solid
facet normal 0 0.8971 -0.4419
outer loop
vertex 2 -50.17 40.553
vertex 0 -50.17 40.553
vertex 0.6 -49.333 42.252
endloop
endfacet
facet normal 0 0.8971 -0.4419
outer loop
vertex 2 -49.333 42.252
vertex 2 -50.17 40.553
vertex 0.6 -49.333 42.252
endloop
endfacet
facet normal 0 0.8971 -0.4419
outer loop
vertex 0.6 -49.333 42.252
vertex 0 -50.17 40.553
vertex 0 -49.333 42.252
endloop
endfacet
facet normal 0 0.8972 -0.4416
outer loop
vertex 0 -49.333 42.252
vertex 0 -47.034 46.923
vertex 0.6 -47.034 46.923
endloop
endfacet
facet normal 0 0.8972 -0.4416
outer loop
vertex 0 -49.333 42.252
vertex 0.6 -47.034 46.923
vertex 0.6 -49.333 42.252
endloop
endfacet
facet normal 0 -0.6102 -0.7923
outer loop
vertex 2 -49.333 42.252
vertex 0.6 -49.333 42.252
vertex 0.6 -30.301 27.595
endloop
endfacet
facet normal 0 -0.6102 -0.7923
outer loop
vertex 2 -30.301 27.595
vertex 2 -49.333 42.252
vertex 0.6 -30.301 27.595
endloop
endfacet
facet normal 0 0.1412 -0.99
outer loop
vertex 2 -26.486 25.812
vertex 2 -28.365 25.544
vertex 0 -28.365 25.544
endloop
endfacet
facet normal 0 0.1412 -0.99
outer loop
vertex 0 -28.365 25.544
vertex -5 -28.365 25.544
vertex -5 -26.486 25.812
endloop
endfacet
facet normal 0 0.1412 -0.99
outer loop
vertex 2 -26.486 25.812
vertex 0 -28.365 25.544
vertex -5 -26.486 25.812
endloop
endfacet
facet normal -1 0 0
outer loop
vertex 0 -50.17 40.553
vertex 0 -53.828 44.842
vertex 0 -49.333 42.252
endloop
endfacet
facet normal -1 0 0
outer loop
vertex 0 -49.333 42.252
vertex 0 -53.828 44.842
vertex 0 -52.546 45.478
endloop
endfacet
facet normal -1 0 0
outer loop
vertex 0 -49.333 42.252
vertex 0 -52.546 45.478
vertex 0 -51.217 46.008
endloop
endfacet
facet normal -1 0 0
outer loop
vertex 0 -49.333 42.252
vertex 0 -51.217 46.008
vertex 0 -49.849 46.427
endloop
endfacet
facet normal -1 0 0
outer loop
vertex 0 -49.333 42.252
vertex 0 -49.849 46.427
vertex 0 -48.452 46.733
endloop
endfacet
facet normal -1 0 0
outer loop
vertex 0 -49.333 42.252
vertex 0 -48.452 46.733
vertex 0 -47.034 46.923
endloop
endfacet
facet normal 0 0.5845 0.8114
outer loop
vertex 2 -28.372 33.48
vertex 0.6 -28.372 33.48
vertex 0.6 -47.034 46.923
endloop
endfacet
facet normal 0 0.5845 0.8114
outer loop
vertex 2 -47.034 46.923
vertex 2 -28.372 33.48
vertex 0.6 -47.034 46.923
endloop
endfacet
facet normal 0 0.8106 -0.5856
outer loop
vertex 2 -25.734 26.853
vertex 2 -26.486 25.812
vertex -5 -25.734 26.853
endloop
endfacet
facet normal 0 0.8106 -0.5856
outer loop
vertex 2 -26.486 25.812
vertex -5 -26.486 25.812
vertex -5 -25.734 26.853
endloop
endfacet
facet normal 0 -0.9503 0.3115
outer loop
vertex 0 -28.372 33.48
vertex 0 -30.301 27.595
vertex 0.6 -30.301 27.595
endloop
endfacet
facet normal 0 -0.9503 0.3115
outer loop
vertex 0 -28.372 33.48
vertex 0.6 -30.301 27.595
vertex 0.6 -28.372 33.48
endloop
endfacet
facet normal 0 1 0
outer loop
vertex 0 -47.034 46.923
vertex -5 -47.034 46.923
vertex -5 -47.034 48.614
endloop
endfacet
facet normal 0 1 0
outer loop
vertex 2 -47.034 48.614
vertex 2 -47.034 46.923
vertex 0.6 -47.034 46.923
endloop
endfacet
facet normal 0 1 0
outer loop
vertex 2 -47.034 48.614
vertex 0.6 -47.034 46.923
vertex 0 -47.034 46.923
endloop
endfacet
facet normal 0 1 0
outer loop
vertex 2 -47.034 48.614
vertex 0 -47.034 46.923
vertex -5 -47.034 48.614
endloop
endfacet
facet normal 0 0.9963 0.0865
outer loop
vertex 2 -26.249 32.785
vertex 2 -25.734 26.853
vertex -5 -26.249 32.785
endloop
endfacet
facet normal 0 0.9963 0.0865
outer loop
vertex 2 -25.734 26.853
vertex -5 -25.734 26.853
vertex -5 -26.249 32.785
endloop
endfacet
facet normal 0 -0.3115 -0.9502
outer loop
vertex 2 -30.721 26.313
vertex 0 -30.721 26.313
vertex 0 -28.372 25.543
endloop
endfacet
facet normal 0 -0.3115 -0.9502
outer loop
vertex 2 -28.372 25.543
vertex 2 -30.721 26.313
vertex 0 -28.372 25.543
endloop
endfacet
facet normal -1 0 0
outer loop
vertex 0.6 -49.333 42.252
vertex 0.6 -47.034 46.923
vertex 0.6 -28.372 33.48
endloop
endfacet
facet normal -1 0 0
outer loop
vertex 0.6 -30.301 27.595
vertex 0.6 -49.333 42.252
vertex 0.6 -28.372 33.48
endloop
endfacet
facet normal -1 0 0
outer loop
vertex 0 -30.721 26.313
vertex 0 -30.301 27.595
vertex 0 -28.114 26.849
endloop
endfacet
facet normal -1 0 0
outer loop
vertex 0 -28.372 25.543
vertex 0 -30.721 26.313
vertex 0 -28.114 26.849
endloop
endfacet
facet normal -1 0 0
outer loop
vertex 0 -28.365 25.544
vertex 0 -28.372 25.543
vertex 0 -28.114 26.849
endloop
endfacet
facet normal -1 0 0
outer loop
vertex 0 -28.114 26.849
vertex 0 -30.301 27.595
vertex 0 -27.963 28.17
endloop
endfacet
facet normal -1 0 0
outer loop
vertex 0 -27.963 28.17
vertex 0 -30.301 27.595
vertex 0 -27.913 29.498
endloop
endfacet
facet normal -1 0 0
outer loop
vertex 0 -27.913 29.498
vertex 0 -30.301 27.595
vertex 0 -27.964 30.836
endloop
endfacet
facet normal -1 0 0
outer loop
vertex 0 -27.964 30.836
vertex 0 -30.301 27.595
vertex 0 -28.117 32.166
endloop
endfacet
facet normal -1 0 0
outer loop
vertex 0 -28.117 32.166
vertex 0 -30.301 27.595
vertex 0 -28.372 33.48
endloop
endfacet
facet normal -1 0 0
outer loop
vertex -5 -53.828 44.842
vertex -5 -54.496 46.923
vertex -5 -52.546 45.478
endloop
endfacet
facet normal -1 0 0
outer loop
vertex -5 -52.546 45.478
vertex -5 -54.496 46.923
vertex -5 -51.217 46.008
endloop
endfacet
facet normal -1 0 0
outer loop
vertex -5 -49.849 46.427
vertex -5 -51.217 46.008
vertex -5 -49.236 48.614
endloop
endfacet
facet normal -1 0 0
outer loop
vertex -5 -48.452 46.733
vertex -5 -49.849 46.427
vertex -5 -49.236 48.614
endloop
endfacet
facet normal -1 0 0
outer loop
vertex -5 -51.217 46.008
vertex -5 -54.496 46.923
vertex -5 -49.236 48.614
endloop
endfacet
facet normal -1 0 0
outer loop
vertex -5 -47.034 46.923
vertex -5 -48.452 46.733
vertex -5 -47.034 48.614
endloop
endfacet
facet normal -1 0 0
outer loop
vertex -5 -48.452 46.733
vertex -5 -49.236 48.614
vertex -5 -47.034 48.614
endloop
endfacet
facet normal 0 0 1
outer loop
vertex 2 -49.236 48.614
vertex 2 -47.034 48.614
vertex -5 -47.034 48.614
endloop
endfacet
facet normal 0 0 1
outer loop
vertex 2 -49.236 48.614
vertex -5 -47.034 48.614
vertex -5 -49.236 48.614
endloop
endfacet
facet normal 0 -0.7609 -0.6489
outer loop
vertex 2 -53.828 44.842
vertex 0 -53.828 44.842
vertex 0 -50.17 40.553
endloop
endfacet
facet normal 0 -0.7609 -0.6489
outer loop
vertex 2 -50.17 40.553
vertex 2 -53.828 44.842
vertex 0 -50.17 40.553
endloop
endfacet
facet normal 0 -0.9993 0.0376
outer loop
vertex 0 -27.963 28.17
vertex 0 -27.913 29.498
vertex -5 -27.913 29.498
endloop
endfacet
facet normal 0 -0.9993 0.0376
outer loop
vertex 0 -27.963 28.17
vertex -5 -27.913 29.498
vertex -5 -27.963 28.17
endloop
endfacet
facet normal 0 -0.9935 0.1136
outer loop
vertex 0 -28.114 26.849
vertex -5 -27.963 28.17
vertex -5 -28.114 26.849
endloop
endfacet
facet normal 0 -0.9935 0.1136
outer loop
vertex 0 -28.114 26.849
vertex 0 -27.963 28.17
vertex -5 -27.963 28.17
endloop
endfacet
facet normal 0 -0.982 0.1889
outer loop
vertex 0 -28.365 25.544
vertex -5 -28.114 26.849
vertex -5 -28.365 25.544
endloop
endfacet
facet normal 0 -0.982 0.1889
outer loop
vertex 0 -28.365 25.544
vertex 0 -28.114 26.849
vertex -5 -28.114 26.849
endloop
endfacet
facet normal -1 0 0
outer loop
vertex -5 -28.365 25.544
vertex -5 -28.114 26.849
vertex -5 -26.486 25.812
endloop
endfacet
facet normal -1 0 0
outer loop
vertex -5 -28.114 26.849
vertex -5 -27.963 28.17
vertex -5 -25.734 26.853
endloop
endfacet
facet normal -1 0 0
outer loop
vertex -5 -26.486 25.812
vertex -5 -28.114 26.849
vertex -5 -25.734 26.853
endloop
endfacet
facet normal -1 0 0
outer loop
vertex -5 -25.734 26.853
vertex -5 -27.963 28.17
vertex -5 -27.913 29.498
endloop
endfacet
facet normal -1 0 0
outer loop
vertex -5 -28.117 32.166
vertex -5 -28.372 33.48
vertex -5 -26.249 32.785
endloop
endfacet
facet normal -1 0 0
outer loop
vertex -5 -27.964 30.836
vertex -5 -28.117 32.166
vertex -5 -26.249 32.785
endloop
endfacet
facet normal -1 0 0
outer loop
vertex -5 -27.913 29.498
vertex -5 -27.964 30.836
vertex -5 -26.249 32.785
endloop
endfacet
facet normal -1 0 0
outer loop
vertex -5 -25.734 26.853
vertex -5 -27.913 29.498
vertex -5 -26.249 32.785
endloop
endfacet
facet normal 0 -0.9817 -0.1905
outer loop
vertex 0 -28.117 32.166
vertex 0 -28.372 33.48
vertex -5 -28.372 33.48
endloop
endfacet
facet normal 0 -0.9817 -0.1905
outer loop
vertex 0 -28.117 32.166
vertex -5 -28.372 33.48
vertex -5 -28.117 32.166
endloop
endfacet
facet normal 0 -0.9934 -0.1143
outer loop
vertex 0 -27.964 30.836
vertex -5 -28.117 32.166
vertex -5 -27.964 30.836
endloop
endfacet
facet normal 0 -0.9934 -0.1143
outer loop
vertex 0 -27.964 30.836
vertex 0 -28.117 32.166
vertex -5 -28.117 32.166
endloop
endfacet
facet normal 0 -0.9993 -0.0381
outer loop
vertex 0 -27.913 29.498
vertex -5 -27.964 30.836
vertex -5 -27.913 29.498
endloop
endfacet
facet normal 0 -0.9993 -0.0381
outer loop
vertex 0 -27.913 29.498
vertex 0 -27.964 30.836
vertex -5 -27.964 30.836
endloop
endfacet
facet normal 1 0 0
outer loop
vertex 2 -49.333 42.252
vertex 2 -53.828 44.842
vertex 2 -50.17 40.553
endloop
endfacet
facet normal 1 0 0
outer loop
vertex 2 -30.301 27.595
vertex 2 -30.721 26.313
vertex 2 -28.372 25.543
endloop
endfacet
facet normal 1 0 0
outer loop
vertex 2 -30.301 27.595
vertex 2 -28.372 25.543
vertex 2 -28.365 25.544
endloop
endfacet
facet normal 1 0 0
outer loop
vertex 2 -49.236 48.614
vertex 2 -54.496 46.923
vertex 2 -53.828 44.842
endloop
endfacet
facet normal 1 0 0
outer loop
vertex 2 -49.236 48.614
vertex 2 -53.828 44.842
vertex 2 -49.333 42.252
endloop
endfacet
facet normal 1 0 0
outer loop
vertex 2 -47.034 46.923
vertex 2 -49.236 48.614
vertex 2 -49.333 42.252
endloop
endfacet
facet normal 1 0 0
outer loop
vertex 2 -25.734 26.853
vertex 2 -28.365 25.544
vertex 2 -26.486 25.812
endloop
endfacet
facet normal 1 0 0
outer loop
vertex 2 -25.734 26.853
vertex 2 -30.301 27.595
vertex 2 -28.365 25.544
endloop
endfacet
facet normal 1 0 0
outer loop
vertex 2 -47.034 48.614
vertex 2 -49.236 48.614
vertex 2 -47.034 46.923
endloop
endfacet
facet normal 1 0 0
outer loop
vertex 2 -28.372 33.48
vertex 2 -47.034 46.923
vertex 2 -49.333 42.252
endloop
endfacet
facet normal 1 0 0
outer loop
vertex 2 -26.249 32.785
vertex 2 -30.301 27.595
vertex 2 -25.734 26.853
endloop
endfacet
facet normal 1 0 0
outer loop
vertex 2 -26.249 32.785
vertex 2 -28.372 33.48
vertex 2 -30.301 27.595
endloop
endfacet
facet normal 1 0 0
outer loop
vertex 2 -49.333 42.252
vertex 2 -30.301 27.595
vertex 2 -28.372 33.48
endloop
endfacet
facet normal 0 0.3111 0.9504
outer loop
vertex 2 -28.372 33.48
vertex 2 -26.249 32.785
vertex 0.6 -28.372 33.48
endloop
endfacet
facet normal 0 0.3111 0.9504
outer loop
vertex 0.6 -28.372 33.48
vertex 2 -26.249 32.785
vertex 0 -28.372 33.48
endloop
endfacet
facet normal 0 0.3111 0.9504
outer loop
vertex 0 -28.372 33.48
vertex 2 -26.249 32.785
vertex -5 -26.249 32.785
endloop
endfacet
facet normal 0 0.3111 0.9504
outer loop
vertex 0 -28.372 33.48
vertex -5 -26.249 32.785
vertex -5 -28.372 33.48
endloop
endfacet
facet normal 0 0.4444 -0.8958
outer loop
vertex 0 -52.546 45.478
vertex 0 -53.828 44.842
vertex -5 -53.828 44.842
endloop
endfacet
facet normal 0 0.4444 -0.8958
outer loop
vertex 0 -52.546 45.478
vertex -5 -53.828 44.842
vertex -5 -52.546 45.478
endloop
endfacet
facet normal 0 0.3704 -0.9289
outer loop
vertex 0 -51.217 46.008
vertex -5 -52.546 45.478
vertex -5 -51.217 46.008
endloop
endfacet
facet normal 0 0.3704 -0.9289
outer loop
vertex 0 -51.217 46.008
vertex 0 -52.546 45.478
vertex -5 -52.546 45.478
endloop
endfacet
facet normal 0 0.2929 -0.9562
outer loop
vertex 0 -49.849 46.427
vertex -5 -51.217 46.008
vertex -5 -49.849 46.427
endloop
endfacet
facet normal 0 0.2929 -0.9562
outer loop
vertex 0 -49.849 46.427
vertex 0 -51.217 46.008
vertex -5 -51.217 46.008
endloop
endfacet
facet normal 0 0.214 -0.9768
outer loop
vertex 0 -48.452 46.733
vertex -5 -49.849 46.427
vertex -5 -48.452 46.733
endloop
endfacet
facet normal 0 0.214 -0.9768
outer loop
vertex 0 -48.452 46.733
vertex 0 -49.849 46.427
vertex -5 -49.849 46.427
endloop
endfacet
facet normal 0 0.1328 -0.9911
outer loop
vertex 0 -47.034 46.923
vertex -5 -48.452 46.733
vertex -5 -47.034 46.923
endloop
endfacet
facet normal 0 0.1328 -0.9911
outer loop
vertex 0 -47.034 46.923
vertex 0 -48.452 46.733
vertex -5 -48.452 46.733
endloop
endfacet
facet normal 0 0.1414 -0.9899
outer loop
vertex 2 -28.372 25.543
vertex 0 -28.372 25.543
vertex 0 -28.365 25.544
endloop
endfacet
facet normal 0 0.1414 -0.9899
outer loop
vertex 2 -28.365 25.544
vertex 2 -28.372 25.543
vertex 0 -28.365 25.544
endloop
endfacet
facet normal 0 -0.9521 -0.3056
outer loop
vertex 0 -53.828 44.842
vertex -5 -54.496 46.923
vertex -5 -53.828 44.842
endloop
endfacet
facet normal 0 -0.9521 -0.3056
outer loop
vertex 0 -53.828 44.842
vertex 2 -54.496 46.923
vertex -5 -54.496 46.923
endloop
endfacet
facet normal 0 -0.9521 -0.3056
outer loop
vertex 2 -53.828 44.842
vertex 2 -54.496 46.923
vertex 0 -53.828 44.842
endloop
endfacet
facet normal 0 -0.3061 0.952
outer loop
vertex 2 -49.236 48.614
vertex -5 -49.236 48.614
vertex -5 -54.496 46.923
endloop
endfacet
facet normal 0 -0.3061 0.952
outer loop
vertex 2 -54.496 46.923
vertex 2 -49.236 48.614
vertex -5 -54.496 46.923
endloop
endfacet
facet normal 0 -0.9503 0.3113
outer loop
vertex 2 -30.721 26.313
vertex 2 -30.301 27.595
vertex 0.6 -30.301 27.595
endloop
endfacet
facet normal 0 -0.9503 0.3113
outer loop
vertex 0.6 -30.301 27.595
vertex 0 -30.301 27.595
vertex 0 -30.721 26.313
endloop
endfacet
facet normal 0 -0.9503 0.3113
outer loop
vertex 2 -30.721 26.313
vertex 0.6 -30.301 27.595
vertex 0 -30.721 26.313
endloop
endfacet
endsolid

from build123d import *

# Parameters (mm, degrees)
F1_DEPTH = 2
F2_DEPTH = 0.6
F3_DEPTH = 5


with BuildPart() as f1:
    # F0 (on Right) → F1 (new body)
    with BuildSketch(Plane.YZ):
        with BuildLine():
            Line((-49.333436, 42.25241), (-47.034119, 46.923187))
            ThreePointArc((-47.034119, 46.923187), (-50.537652, 46.231209), (-53.82776, 44.842407))
            Line((-53.82776, 44.842407), (-50.170235, 40.552557))
            Line((-50.170235, 40.552557), (-49.333436, 42.25241))
        make_face()
        Polygon((-30.300626, 27.594882), (-28.371687, 33.48021), (-47.034119, 46.923187), (-49.333436, 42.25241), align=None)
        with BuildLine():
            ThreePointArc((-28.365389, 25.54377), (-28.026232, 27.508204), (-27.912688, 29.498465))
            ThreePointArc((-27.912688, 29.498465), (-28.027817, 31.502521), (-28.371687, 33.48021))
            Line((-28.371687, 33.48021), (-30.300626, 27.594882))
            Line((-30.300626, 27.594882), (-30.72083, 26.312811))
            Line((-30.72083, 26.312811), (-28.371687, 25.542871))
            Line((-28.371687, 25.542871), (-28.365389, 25.54377))
        make_face()
        with BuildLine():
            ThreePointArc((-28.371687, 33.48021), (-28.027817, 31.502521), (-27.912688, 29.498465))
            ThreePointArc((-27.912688, 29.498465), (-28.026232, 27.508204), (-28.365389, 25.54377))
            Line((-28.365389, 25.54377), (-26.486235, 25.812047))
            Line((-26.486235, 25.812047), (-25.734026, 26.853122))
            Line((-25.734026, 26.853122), (-26.24937, 32.784612))
            Line((-26.24937, 32.784612), (-28.371687, 33.48021))
        make_face()
        with BuildLine():
            ThreePointArc((-53.82776, 44.842407), (-50.537652, 46.231209), (-47.034119, 46.923187))
            Line((-47.034119, 46.923187), (-47.034119, 48.613626))
            Line((-47.034119, 48.613626), (-49.236418, 48.613626))
            Line((-49.236418, 48.613626), (-54.496467, 46.923187))
            Line((-54.496467, 46.923187), (-53.82776, 44.842407))
        make_face()
    extrude(amount=F1_DEPTH)

    # F0 (on Right) → F2 (cut)
    with BuildSketch(Plane.YZ):
        Polygon((-30.300626, 27.594882), (-28.371687, 33.48021), (-47.034119, 46.923187), (-49.333436, 42.25241), align=None)
    extrude(amount=F2_DEPTH, mode=Mode.SUBTRACT)

    # F0 (on Right) → F3 (join)
    with BuildSketch(Plane.YZ):
        with BuildLine():
            ThreePointArc((-53.82776, 44.842407), (-50.537652, 46.231209), (-47.034119, 46.923187))
            Line((-47.034119, 46.923187), (-47.034119, 48.613626))
            Line((-47.034119, 48.613626), (-49.236418, 48.613626))
            Line((-49.236418, 48.613626), (-54.496467, 46.923187))
            Line((-54.496467, 46.923187), (-53.82776, 44.842407))
        make_face()
        with BuildLine():
            ThreePointArc((-28.371687, 33.48021), (-28.027817, 31.502521), (-27.912688, 29.498465))
            ThreePointArc((-27.912688, 29.498465), (-28.026232, 27.508204), (-28.365389, 25.54377))
            Line((-28.365389, 25.54377), (-26.486235, 25.812047))
            Line((-26.486235, 25.812047), (-25.734026, 26.853122))
            Line((-25.734026, 26.853122), (-26.24937, 32.784612))
            Line((-26.24937, 32.784612), (-28.371687, 33.48021))
        make_face()
    extrude(amount=-F3_DEPTH)


solid = f1.part
